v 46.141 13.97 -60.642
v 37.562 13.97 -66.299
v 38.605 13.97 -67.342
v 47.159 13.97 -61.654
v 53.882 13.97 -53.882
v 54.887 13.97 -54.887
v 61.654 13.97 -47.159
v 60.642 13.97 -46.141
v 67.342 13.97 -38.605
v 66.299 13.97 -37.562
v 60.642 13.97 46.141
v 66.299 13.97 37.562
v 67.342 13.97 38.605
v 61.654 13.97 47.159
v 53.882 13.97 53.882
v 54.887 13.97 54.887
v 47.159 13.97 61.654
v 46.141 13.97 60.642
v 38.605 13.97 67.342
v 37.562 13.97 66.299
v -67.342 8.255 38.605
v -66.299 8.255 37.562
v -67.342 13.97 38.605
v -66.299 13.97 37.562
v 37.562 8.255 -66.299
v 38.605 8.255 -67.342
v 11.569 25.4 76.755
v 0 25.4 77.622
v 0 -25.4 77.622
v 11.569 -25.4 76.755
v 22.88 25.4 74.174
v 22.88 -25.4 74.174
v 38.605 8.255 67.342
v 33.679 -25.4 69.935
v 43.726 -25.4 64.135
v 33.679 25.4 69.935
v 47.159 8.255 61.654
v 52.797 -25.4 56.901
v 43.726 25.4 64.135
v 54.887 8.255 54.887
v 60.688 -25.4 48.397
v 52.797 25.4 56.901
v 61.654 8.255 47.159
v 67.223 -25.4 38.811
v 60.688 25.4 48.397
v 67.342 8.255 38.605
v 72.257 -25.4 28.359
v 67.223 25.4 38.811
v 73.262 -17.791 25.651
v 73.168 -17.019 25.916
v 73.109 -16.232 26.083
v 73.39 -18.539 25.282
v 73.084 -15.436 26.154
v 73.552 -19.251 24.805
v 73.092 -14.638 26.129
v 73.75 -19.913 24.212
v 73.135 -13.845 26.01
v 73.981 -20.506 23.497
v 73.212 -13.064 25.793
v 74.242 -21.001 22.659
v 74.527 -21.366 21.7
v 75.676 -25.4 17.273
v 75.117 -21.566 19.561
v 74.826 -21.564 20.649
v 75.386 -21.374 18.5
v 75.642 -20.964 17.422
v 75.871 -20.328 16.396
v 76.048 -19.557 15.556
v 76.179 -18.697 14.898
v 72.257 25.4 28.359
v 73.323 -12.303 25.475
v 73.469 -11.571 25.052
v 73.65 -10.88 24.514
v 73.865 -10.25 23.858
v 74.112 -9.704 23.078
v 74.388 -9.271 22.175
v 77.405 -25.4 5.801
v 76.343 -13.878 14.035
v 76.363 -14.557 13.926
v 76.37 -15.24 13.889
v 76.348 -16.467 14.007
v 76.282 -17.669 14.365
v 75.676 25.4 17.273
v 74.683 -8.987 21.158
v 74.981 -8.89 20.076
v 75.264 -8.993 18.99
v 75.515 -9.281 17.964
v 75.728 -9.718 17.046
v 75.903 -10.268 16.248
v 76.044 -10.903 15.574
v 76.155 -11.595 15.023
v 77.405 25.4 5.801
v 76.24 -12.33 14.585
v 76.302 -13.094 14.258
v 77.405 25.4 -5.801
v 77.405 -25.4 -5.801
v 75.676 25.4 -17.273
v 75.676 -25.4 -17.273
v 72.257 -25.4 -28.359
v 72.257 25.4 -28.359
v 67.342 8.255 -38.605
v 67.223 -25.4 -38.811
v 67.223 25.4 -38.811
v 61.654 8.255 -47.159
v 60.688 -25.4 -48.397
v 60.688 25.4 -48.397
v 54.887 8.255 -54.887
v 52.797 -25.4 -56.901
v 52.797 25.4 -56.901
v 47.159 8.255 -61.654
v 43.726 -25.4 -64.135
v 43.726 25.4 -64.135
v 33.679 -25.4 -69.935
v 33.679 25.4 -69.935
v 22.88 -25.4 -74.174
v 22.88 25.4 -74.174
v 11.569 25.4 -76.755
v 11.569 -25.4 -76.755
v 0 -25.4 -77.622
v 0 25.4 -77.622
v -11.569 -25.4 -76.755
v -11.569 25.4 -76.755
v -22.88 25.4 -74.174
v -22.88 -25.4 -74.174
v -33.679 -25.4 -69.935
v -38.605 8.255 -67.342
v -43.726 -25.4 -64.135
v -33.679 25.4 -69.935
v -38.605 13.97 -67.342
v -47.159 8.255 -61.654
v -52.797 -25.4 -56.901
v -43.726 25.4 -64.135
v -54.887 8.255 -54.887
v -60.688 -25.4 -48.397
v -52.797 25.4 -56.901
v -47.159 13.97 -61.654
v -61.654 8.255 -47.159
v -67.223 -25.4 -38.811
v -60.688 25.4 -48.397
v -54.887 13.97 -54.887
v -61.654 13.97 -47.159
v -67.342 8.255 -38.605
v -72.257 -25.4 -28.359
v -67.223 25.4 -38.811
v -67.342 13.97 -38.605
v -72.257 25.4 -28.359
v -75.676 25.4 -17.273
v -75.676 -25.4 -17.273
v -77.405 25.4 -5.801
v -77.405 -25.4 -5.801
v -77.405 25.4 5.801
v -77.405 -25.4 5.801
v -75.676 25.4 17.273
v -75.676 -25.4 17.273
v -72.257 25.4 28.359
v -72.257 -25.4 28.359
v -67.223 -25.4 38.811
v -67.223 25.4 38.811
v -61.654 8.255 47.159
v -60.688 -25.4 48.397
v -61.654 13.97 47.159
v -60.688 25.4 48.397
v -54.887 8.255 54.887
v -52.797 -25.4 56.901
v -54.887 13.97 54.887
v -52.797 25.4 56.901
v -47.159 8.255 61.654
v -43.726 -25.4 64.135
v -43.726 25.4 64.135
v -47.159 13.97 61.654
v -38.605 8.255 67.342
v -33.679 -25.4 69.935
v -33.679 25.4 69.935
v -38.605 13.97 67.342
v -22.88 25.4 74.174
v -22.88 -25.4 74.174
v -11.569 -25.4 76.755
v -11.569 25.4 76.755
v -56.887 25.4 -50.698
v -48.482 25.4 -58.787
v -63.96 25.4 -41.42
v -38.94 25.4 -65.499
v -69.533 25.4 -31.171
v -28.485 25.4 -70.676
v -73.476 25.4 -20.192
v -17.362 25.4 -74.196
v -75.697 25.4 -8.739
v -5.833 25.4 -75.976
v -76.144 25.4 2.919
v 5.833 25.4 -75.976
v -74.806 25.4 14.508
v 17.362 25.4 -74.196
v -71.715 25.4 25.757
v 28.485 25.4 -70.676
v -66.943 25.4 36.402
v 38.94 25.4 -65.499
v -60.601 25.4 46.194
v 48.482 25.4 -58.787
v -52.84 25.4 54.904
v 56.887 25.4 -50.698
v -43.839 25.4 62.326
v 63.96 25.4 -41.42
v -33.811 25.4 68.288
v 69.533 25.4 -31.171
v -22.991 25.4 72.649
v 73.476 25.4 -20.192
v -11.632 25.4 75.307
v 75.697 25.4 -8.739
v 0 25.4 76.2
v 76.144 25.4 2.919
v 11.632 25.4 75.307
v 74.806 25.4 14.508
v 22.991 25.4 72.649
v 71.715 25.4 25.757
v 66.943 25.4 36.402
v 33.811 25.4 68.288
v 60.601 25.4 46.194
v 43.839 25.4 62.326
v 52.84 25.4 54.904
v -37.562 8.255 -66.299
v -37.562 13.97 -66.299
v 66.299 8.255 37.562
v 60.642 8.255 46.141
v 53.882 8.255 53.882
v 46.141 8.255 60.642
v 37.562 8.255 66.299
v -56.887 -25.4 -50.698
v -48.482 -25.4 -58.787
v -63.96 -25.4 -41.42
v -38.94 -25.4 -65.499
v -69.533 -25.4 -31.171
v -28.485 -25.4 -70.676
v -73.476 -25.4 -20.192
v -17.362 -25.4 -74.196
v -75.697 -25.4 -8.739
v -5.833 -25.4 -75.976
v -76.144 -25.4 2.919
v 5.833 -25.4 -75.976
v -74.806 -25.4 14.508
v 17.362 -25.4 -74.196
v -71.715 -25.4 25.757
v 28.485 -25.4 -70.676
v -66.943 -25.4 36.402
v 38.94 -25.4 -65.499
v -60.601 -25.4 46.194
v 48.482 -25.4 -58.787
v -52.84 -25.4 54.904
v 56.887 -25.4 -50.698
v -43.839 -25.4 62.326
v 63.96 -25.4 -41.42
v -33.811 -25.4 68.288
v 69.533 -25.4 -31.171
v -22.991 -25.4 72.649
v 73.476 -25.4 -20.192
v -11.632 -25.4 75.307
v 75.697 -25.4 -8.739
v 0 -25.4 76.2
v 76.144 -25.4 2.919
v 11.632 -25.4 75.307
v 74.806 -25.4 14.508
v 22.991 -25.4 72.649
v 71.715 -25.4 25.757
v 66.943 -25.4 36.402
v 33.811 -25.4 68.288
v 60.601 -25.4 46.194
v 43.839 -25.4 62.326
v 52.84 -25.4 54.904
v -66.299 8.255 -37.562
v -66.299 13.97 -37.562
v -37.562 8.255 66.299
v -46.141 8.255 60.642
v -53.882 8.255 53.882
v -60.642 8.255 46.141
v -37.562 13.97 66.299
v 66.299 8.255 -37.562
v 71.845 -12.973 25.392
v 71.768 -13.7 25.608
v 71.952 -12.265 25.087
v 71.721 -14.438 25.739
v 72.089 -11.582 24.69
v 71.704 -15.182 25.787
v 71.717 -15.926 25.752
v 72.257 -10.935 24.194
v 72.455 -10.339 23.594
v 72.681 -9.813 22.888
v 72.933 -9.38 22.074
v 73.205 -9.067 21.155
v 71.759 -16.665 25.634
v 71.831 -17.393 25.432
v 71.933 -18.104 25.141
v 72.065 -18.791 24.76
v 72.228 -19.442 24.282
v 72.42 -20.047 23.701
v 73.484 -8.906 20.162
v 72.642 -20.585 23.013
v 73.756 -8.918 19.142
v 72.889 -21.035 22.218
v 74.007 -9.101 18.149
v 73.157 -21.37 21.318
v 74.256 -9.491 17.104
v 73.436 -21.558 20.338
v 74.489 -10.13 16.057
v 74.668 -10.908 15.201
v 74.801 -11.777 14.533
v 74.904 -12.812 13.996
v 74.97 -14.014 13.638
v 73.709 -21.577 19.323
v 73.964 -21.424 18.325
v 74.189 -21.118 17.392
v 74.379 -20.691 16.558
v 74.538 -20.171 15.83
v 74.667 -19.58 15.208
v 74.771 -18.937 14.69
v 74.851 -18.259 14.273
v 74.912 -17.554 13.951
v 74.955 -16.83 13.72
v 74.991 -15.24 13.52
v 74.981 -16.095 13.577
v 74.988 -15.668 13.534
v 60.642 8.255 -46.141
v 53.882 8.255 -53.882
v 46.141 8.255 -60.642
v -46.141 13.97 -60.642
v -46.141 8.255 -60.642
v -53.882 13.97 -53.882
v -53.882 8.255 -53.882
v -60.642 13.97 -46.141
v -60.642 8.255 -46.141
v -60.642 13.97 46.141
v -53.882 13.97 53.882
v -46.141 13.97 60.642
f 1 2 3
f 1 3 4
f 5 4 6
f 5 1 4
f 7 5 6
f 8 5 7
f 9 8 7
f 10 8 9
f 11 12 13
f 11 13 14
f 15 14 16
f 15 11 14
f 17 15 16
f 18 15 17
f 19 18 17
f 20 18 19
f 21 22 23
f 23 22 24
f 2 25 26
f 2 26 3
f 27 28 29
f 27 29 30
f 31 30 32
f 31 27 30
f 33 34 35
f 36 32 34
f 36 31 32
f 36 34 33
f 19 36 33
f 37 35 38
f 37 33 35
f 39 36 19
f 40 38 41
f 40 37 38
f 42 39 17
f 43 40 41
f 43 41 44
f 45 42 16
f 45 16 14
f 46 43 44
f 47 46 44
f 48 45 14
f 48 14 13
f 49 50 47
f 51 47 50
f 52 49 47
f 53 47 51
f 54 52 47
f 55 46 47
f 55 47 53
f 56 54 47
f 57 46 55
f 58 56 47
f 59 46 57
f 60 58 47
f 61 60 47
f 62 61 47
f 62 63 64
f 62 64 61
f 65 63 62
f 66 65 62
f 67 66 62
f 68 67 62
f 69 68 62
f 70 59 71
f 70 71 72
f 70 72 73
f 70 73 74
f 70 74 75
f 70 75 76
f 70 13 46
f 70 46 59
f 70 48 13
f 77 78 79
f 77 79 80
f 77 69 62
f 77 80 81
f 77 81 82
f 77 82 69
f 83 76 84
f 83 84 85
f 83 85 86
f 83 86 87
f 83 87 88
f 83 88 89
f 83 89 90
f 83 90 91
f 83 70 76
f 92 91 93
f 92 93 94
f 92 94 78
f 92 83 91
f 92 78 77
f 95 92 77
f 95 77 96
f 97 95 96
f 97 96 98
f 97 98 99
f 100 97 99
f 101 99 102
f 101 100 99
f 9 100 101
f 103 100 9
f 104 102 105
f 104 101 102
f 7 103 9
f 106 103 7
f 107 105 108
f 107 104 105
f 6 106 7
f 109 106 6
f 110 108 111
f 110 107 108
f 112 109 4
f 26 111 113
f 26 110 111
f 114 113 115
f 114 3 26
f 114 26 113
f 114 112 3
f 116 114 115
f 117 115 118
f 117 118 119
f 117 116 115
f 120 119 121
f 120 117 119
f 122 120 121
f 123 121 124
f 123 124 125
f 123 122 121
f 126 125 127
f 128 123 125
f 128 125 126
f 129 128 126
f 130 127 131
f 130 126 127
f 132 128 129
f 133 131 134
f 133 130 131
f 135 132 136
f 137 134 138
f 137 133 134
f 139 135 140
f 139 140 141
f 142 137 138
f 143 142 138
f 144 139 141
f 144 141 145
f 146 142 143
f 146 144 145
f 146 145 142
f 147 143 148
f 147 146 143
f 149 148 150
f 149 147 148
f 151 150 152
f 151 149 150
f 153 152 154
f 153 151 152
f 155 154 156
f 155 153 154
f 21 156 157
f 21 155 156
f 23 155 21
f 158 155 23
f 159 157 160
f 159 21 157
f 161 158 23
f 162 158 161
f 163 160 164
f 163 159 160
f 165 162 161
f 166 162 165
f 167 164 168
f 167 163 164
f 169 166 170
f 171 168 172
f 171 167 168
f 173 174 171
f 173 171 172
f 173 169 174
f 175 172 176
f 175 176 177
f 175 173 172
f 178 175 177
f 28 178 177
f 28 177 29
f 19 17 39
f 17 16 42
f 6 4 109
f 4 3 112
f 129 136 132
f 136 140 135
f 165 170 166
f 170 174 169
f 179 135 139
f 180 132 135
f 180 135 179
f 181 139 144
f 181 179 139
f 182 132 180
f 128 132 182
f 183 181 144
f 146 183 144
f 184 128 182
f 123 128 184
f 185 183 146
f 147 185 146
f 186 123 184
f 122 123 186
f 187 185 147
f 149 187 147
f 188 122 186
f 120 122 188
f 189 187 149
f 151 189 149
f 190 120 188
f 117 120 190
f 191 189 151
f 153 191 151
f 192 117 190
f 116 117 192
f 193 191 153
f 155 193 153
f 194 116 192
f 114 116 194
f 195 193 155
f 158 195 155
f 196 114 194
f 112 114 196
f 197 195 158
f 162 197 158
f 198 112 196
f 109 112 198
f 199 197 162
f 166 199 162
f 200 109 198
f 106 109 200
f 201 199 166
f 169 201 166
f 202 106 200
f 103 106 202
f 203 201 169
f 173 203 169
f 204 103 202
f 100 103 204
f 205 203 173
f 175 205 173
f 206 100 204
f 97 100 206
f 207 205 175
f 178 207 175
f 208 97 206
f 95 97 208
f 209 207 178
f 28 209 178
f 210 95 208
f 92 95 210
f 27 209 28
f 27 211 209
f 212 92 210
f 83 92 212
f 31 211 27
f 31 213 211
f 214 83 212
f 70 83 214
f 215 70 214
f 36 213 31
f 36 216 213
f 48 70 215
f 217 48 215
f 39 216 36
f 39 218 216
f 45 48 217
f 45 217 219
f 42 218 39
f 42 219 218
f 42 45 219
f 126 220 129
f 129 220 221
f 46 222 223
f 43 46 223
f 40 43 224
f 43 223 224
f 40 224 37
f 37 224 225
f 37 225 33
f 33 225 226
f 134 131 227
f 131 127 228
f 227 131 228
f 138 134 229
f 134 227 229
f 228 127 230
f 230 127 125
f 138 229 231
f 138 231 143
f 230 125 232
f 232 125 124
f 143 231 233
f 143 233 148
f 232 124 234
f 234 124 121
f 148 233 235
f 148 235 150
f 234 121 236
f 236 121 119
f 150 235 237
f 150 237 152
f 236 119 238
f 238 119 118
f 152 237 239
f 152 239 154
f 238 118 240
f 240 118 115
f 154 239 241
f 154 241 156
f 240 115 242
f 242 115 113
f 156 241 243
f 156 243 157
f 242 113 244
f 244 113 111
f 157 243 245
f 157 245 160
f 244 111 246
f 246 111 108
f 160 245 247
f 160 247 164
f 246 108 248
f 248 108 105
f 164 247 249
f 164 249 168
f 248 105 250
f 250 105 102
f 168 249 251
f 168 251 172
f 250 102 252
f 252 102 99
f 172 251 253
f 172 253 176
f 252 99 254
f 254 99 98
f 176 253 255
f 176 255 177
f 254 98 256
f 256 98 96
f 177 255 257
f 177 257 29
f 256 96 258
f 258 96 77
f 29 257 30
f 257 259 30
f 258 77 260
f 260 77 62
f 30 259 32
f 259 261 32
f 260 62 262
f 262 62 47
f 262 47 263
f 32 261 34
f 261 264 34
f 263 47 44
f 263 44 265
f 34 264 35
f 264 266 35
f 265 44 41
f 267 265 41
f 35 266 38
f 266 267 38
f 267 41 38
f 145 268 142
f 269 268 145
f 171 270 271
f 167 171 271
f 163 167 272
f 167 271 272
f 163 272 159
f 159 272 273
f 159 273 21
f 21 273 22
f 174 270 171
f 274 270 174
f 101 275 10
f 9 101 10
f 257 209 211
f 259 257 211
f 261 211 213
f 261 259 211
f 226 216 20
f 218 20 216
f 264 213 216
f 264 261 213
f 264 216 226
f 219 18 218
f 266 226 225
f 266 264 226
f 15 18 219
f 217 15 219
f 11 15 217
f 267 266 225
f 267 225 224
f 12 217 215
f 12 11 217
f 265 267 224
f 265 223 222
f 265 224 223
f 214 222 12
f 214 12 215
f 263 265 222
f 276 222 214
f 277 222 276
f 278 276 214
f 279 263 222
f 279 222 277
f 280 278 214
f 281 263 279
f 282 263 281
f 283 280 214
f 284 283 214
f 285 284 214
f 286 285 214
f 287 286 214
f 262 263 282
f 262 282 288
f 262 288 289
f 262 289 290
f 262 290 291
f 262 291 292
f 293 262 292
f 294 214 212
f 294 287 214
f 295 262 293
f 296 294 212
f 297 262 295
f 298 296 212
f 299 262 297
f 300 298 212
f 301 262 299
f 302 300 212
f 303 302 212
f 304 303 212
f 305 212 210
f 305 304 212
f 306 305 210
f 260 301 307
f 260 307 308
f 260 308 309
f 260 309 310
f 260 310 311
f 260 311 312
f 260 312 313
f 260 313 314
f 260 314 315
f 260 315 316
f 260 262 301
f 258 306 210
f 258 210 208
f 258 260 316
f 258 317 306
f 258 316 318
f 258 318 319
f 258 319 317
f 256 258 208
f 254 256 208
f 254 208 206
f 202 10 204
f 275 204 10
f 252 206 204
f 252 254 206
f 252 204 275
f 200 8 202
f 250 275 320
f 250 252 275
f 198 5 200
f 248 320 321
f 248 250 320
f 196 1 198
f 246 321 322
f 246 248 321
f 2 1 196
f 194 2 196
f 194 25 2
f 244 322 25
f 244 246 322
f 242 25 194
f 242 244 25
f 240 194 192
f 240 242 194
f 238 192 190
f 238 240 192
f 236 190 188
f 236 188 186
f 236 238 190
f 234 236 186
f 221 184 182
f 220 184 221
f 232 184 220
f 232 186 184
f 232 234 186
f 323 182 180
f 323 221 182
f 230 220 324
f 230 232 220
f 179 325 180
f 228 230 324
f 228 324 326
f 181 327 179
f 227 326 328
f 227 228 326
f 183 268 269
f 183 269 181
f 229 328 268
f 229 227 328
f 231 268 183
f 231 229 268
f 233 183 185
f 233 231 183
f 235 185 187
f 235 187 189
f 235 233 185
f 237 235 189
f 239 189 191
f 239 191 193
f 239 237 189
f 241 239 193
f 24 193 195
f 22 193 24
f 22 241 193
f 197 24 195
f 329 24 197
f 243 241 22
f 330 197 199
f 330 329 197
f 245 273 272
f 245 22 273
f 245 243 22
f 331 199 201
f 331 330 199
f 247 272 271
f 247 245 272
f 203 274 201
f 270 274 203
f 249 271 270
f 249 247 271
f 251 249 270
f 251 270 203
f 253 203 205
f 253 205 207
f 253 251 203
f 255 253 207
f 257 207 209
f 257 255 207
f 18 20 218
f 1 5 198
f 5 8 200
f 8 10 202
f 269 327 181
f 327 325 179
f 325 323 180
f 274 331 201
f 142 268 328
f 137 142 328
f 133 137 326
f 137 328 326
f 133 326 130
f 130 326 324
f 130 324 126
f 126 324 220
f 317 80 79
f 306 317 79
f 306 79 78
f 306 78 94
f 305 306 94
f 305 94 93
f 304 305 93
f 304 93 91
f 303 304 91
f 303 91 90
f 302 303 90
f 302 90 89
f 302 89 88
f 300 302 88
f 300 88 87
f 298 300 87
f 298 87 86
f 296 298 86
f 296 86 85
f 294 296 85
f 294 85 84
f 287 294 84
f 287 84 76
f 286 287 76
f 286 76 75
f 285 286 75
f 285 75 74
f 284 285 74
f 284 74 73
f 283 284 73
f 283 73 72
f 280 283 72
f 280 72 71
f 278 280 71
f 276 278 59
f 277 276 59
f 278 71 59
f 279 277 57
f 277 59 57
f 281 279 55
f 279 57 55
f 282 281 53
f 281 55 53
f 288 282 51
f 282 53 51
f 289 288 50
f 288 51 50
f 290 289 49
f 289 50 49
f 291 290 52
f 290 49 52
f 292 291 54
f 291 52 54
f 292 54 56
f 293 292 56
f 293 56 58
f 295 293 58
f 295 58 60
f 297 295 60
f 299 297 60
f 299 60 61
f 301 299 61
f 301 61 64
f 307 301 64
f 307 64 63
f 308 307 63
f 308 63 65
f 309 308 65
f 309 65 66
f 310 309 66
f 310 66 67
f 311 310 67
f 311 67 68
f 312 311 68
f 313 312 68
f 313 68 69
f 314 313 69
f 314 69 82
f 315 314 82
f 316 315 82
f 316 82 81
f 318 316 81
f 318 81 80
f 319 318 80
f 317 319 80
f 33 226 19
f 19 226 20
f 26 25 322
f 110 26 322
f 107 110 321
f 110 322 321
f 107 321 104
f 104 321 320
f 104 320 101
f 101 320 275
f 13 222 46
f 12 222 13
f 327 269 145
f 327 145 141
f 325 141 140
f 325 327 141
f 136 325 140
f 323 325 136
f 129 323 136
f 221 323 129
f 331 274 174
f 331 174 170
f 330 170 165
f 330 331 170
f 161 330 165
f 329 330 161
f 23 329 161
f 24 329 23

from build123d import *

# Parameters (mm, degrees)
SKETCH1_R           = 77.6224
SKETCH1_R_2         = 76.2
BOSS_EXTRUDE1_DEPTH = 25.4
SKETCH2_W           = 40.64
SKETCH2_H           = 5.715
CUT_EXTRUDE1_DEPTH  = 113.674903876
CIRPATTERN1_COUNT   = 4
SKETCH3_R           = 6.35
CUT_EXTRUDE2_DEPTH  = 6.35


with BuildPart() as part:
    # Sketch1 → Boss-Extrude1 (new, symmetric)
    with BuildSketch(Plane(origin=(0, 0, 0), x_dir=(1, 0, 0), z_dir=(0, 1, 0))):
        with Locations(Location((0, 0, 0), (0, 0, 270))):
            Circle(SKETCH1_R)
        with Locations(Location((0, 0, 0), (0, 0, 270))):
            Circle(SKETCH1_R_2, mode=Mode.SUBTRACT)
    extrude(amount=BOSS_EXTRUDE1_DEPTH, both=True)

    # Sketch2 → Cut-Extrude1 (cut, through all)
    with BuildSketch(Plane(origin=(0, 0, 0), x_dir=(0.7071067811865477, 0, 0.7071067811865475), z_dir=(-0.7071067811865475, 0, 0.7071067811865477))):
        with Locations((0, 11.1125)):
            Rectangle(SKETCH2_W, SKETCH2_H)
    cut_extrude1 = extrude(amount=-CUT_EXTRUDE1_DEPTH, mode=Mode.SUBTRACT)

    # CirPattern1: Cut-Extrude1 ×4 about axis
    cirpattern1_axis = Axis((0, 0, 0), (0, 1, 0))
    for i in range(1, CIRPATTERN1_COUNT):
        add(cut_extrude1.rotate(cirpattern1_axis, i * 360 / CIRPATTERN1_COUNT), mode=Mode.SUBTRACT)

    # Sketch3 → Cut-Extrude2 (cut)
    with BuildSketch(Plane(origin=(74.977480859, 0, 20.090155447), x_dir=(0, -1, 0), z_dir=(0.9659258262890681, 0, 0.25881904510252135))):
        with Locations(Location((15.24, 0, 0), (0, 0, 90))):
            Circle(SKETCH3_R)
    extrude(amount=-CUT_EXTRUDE2_DEPTH, mode=Mode.SUBTRACT)


solid = part.part
